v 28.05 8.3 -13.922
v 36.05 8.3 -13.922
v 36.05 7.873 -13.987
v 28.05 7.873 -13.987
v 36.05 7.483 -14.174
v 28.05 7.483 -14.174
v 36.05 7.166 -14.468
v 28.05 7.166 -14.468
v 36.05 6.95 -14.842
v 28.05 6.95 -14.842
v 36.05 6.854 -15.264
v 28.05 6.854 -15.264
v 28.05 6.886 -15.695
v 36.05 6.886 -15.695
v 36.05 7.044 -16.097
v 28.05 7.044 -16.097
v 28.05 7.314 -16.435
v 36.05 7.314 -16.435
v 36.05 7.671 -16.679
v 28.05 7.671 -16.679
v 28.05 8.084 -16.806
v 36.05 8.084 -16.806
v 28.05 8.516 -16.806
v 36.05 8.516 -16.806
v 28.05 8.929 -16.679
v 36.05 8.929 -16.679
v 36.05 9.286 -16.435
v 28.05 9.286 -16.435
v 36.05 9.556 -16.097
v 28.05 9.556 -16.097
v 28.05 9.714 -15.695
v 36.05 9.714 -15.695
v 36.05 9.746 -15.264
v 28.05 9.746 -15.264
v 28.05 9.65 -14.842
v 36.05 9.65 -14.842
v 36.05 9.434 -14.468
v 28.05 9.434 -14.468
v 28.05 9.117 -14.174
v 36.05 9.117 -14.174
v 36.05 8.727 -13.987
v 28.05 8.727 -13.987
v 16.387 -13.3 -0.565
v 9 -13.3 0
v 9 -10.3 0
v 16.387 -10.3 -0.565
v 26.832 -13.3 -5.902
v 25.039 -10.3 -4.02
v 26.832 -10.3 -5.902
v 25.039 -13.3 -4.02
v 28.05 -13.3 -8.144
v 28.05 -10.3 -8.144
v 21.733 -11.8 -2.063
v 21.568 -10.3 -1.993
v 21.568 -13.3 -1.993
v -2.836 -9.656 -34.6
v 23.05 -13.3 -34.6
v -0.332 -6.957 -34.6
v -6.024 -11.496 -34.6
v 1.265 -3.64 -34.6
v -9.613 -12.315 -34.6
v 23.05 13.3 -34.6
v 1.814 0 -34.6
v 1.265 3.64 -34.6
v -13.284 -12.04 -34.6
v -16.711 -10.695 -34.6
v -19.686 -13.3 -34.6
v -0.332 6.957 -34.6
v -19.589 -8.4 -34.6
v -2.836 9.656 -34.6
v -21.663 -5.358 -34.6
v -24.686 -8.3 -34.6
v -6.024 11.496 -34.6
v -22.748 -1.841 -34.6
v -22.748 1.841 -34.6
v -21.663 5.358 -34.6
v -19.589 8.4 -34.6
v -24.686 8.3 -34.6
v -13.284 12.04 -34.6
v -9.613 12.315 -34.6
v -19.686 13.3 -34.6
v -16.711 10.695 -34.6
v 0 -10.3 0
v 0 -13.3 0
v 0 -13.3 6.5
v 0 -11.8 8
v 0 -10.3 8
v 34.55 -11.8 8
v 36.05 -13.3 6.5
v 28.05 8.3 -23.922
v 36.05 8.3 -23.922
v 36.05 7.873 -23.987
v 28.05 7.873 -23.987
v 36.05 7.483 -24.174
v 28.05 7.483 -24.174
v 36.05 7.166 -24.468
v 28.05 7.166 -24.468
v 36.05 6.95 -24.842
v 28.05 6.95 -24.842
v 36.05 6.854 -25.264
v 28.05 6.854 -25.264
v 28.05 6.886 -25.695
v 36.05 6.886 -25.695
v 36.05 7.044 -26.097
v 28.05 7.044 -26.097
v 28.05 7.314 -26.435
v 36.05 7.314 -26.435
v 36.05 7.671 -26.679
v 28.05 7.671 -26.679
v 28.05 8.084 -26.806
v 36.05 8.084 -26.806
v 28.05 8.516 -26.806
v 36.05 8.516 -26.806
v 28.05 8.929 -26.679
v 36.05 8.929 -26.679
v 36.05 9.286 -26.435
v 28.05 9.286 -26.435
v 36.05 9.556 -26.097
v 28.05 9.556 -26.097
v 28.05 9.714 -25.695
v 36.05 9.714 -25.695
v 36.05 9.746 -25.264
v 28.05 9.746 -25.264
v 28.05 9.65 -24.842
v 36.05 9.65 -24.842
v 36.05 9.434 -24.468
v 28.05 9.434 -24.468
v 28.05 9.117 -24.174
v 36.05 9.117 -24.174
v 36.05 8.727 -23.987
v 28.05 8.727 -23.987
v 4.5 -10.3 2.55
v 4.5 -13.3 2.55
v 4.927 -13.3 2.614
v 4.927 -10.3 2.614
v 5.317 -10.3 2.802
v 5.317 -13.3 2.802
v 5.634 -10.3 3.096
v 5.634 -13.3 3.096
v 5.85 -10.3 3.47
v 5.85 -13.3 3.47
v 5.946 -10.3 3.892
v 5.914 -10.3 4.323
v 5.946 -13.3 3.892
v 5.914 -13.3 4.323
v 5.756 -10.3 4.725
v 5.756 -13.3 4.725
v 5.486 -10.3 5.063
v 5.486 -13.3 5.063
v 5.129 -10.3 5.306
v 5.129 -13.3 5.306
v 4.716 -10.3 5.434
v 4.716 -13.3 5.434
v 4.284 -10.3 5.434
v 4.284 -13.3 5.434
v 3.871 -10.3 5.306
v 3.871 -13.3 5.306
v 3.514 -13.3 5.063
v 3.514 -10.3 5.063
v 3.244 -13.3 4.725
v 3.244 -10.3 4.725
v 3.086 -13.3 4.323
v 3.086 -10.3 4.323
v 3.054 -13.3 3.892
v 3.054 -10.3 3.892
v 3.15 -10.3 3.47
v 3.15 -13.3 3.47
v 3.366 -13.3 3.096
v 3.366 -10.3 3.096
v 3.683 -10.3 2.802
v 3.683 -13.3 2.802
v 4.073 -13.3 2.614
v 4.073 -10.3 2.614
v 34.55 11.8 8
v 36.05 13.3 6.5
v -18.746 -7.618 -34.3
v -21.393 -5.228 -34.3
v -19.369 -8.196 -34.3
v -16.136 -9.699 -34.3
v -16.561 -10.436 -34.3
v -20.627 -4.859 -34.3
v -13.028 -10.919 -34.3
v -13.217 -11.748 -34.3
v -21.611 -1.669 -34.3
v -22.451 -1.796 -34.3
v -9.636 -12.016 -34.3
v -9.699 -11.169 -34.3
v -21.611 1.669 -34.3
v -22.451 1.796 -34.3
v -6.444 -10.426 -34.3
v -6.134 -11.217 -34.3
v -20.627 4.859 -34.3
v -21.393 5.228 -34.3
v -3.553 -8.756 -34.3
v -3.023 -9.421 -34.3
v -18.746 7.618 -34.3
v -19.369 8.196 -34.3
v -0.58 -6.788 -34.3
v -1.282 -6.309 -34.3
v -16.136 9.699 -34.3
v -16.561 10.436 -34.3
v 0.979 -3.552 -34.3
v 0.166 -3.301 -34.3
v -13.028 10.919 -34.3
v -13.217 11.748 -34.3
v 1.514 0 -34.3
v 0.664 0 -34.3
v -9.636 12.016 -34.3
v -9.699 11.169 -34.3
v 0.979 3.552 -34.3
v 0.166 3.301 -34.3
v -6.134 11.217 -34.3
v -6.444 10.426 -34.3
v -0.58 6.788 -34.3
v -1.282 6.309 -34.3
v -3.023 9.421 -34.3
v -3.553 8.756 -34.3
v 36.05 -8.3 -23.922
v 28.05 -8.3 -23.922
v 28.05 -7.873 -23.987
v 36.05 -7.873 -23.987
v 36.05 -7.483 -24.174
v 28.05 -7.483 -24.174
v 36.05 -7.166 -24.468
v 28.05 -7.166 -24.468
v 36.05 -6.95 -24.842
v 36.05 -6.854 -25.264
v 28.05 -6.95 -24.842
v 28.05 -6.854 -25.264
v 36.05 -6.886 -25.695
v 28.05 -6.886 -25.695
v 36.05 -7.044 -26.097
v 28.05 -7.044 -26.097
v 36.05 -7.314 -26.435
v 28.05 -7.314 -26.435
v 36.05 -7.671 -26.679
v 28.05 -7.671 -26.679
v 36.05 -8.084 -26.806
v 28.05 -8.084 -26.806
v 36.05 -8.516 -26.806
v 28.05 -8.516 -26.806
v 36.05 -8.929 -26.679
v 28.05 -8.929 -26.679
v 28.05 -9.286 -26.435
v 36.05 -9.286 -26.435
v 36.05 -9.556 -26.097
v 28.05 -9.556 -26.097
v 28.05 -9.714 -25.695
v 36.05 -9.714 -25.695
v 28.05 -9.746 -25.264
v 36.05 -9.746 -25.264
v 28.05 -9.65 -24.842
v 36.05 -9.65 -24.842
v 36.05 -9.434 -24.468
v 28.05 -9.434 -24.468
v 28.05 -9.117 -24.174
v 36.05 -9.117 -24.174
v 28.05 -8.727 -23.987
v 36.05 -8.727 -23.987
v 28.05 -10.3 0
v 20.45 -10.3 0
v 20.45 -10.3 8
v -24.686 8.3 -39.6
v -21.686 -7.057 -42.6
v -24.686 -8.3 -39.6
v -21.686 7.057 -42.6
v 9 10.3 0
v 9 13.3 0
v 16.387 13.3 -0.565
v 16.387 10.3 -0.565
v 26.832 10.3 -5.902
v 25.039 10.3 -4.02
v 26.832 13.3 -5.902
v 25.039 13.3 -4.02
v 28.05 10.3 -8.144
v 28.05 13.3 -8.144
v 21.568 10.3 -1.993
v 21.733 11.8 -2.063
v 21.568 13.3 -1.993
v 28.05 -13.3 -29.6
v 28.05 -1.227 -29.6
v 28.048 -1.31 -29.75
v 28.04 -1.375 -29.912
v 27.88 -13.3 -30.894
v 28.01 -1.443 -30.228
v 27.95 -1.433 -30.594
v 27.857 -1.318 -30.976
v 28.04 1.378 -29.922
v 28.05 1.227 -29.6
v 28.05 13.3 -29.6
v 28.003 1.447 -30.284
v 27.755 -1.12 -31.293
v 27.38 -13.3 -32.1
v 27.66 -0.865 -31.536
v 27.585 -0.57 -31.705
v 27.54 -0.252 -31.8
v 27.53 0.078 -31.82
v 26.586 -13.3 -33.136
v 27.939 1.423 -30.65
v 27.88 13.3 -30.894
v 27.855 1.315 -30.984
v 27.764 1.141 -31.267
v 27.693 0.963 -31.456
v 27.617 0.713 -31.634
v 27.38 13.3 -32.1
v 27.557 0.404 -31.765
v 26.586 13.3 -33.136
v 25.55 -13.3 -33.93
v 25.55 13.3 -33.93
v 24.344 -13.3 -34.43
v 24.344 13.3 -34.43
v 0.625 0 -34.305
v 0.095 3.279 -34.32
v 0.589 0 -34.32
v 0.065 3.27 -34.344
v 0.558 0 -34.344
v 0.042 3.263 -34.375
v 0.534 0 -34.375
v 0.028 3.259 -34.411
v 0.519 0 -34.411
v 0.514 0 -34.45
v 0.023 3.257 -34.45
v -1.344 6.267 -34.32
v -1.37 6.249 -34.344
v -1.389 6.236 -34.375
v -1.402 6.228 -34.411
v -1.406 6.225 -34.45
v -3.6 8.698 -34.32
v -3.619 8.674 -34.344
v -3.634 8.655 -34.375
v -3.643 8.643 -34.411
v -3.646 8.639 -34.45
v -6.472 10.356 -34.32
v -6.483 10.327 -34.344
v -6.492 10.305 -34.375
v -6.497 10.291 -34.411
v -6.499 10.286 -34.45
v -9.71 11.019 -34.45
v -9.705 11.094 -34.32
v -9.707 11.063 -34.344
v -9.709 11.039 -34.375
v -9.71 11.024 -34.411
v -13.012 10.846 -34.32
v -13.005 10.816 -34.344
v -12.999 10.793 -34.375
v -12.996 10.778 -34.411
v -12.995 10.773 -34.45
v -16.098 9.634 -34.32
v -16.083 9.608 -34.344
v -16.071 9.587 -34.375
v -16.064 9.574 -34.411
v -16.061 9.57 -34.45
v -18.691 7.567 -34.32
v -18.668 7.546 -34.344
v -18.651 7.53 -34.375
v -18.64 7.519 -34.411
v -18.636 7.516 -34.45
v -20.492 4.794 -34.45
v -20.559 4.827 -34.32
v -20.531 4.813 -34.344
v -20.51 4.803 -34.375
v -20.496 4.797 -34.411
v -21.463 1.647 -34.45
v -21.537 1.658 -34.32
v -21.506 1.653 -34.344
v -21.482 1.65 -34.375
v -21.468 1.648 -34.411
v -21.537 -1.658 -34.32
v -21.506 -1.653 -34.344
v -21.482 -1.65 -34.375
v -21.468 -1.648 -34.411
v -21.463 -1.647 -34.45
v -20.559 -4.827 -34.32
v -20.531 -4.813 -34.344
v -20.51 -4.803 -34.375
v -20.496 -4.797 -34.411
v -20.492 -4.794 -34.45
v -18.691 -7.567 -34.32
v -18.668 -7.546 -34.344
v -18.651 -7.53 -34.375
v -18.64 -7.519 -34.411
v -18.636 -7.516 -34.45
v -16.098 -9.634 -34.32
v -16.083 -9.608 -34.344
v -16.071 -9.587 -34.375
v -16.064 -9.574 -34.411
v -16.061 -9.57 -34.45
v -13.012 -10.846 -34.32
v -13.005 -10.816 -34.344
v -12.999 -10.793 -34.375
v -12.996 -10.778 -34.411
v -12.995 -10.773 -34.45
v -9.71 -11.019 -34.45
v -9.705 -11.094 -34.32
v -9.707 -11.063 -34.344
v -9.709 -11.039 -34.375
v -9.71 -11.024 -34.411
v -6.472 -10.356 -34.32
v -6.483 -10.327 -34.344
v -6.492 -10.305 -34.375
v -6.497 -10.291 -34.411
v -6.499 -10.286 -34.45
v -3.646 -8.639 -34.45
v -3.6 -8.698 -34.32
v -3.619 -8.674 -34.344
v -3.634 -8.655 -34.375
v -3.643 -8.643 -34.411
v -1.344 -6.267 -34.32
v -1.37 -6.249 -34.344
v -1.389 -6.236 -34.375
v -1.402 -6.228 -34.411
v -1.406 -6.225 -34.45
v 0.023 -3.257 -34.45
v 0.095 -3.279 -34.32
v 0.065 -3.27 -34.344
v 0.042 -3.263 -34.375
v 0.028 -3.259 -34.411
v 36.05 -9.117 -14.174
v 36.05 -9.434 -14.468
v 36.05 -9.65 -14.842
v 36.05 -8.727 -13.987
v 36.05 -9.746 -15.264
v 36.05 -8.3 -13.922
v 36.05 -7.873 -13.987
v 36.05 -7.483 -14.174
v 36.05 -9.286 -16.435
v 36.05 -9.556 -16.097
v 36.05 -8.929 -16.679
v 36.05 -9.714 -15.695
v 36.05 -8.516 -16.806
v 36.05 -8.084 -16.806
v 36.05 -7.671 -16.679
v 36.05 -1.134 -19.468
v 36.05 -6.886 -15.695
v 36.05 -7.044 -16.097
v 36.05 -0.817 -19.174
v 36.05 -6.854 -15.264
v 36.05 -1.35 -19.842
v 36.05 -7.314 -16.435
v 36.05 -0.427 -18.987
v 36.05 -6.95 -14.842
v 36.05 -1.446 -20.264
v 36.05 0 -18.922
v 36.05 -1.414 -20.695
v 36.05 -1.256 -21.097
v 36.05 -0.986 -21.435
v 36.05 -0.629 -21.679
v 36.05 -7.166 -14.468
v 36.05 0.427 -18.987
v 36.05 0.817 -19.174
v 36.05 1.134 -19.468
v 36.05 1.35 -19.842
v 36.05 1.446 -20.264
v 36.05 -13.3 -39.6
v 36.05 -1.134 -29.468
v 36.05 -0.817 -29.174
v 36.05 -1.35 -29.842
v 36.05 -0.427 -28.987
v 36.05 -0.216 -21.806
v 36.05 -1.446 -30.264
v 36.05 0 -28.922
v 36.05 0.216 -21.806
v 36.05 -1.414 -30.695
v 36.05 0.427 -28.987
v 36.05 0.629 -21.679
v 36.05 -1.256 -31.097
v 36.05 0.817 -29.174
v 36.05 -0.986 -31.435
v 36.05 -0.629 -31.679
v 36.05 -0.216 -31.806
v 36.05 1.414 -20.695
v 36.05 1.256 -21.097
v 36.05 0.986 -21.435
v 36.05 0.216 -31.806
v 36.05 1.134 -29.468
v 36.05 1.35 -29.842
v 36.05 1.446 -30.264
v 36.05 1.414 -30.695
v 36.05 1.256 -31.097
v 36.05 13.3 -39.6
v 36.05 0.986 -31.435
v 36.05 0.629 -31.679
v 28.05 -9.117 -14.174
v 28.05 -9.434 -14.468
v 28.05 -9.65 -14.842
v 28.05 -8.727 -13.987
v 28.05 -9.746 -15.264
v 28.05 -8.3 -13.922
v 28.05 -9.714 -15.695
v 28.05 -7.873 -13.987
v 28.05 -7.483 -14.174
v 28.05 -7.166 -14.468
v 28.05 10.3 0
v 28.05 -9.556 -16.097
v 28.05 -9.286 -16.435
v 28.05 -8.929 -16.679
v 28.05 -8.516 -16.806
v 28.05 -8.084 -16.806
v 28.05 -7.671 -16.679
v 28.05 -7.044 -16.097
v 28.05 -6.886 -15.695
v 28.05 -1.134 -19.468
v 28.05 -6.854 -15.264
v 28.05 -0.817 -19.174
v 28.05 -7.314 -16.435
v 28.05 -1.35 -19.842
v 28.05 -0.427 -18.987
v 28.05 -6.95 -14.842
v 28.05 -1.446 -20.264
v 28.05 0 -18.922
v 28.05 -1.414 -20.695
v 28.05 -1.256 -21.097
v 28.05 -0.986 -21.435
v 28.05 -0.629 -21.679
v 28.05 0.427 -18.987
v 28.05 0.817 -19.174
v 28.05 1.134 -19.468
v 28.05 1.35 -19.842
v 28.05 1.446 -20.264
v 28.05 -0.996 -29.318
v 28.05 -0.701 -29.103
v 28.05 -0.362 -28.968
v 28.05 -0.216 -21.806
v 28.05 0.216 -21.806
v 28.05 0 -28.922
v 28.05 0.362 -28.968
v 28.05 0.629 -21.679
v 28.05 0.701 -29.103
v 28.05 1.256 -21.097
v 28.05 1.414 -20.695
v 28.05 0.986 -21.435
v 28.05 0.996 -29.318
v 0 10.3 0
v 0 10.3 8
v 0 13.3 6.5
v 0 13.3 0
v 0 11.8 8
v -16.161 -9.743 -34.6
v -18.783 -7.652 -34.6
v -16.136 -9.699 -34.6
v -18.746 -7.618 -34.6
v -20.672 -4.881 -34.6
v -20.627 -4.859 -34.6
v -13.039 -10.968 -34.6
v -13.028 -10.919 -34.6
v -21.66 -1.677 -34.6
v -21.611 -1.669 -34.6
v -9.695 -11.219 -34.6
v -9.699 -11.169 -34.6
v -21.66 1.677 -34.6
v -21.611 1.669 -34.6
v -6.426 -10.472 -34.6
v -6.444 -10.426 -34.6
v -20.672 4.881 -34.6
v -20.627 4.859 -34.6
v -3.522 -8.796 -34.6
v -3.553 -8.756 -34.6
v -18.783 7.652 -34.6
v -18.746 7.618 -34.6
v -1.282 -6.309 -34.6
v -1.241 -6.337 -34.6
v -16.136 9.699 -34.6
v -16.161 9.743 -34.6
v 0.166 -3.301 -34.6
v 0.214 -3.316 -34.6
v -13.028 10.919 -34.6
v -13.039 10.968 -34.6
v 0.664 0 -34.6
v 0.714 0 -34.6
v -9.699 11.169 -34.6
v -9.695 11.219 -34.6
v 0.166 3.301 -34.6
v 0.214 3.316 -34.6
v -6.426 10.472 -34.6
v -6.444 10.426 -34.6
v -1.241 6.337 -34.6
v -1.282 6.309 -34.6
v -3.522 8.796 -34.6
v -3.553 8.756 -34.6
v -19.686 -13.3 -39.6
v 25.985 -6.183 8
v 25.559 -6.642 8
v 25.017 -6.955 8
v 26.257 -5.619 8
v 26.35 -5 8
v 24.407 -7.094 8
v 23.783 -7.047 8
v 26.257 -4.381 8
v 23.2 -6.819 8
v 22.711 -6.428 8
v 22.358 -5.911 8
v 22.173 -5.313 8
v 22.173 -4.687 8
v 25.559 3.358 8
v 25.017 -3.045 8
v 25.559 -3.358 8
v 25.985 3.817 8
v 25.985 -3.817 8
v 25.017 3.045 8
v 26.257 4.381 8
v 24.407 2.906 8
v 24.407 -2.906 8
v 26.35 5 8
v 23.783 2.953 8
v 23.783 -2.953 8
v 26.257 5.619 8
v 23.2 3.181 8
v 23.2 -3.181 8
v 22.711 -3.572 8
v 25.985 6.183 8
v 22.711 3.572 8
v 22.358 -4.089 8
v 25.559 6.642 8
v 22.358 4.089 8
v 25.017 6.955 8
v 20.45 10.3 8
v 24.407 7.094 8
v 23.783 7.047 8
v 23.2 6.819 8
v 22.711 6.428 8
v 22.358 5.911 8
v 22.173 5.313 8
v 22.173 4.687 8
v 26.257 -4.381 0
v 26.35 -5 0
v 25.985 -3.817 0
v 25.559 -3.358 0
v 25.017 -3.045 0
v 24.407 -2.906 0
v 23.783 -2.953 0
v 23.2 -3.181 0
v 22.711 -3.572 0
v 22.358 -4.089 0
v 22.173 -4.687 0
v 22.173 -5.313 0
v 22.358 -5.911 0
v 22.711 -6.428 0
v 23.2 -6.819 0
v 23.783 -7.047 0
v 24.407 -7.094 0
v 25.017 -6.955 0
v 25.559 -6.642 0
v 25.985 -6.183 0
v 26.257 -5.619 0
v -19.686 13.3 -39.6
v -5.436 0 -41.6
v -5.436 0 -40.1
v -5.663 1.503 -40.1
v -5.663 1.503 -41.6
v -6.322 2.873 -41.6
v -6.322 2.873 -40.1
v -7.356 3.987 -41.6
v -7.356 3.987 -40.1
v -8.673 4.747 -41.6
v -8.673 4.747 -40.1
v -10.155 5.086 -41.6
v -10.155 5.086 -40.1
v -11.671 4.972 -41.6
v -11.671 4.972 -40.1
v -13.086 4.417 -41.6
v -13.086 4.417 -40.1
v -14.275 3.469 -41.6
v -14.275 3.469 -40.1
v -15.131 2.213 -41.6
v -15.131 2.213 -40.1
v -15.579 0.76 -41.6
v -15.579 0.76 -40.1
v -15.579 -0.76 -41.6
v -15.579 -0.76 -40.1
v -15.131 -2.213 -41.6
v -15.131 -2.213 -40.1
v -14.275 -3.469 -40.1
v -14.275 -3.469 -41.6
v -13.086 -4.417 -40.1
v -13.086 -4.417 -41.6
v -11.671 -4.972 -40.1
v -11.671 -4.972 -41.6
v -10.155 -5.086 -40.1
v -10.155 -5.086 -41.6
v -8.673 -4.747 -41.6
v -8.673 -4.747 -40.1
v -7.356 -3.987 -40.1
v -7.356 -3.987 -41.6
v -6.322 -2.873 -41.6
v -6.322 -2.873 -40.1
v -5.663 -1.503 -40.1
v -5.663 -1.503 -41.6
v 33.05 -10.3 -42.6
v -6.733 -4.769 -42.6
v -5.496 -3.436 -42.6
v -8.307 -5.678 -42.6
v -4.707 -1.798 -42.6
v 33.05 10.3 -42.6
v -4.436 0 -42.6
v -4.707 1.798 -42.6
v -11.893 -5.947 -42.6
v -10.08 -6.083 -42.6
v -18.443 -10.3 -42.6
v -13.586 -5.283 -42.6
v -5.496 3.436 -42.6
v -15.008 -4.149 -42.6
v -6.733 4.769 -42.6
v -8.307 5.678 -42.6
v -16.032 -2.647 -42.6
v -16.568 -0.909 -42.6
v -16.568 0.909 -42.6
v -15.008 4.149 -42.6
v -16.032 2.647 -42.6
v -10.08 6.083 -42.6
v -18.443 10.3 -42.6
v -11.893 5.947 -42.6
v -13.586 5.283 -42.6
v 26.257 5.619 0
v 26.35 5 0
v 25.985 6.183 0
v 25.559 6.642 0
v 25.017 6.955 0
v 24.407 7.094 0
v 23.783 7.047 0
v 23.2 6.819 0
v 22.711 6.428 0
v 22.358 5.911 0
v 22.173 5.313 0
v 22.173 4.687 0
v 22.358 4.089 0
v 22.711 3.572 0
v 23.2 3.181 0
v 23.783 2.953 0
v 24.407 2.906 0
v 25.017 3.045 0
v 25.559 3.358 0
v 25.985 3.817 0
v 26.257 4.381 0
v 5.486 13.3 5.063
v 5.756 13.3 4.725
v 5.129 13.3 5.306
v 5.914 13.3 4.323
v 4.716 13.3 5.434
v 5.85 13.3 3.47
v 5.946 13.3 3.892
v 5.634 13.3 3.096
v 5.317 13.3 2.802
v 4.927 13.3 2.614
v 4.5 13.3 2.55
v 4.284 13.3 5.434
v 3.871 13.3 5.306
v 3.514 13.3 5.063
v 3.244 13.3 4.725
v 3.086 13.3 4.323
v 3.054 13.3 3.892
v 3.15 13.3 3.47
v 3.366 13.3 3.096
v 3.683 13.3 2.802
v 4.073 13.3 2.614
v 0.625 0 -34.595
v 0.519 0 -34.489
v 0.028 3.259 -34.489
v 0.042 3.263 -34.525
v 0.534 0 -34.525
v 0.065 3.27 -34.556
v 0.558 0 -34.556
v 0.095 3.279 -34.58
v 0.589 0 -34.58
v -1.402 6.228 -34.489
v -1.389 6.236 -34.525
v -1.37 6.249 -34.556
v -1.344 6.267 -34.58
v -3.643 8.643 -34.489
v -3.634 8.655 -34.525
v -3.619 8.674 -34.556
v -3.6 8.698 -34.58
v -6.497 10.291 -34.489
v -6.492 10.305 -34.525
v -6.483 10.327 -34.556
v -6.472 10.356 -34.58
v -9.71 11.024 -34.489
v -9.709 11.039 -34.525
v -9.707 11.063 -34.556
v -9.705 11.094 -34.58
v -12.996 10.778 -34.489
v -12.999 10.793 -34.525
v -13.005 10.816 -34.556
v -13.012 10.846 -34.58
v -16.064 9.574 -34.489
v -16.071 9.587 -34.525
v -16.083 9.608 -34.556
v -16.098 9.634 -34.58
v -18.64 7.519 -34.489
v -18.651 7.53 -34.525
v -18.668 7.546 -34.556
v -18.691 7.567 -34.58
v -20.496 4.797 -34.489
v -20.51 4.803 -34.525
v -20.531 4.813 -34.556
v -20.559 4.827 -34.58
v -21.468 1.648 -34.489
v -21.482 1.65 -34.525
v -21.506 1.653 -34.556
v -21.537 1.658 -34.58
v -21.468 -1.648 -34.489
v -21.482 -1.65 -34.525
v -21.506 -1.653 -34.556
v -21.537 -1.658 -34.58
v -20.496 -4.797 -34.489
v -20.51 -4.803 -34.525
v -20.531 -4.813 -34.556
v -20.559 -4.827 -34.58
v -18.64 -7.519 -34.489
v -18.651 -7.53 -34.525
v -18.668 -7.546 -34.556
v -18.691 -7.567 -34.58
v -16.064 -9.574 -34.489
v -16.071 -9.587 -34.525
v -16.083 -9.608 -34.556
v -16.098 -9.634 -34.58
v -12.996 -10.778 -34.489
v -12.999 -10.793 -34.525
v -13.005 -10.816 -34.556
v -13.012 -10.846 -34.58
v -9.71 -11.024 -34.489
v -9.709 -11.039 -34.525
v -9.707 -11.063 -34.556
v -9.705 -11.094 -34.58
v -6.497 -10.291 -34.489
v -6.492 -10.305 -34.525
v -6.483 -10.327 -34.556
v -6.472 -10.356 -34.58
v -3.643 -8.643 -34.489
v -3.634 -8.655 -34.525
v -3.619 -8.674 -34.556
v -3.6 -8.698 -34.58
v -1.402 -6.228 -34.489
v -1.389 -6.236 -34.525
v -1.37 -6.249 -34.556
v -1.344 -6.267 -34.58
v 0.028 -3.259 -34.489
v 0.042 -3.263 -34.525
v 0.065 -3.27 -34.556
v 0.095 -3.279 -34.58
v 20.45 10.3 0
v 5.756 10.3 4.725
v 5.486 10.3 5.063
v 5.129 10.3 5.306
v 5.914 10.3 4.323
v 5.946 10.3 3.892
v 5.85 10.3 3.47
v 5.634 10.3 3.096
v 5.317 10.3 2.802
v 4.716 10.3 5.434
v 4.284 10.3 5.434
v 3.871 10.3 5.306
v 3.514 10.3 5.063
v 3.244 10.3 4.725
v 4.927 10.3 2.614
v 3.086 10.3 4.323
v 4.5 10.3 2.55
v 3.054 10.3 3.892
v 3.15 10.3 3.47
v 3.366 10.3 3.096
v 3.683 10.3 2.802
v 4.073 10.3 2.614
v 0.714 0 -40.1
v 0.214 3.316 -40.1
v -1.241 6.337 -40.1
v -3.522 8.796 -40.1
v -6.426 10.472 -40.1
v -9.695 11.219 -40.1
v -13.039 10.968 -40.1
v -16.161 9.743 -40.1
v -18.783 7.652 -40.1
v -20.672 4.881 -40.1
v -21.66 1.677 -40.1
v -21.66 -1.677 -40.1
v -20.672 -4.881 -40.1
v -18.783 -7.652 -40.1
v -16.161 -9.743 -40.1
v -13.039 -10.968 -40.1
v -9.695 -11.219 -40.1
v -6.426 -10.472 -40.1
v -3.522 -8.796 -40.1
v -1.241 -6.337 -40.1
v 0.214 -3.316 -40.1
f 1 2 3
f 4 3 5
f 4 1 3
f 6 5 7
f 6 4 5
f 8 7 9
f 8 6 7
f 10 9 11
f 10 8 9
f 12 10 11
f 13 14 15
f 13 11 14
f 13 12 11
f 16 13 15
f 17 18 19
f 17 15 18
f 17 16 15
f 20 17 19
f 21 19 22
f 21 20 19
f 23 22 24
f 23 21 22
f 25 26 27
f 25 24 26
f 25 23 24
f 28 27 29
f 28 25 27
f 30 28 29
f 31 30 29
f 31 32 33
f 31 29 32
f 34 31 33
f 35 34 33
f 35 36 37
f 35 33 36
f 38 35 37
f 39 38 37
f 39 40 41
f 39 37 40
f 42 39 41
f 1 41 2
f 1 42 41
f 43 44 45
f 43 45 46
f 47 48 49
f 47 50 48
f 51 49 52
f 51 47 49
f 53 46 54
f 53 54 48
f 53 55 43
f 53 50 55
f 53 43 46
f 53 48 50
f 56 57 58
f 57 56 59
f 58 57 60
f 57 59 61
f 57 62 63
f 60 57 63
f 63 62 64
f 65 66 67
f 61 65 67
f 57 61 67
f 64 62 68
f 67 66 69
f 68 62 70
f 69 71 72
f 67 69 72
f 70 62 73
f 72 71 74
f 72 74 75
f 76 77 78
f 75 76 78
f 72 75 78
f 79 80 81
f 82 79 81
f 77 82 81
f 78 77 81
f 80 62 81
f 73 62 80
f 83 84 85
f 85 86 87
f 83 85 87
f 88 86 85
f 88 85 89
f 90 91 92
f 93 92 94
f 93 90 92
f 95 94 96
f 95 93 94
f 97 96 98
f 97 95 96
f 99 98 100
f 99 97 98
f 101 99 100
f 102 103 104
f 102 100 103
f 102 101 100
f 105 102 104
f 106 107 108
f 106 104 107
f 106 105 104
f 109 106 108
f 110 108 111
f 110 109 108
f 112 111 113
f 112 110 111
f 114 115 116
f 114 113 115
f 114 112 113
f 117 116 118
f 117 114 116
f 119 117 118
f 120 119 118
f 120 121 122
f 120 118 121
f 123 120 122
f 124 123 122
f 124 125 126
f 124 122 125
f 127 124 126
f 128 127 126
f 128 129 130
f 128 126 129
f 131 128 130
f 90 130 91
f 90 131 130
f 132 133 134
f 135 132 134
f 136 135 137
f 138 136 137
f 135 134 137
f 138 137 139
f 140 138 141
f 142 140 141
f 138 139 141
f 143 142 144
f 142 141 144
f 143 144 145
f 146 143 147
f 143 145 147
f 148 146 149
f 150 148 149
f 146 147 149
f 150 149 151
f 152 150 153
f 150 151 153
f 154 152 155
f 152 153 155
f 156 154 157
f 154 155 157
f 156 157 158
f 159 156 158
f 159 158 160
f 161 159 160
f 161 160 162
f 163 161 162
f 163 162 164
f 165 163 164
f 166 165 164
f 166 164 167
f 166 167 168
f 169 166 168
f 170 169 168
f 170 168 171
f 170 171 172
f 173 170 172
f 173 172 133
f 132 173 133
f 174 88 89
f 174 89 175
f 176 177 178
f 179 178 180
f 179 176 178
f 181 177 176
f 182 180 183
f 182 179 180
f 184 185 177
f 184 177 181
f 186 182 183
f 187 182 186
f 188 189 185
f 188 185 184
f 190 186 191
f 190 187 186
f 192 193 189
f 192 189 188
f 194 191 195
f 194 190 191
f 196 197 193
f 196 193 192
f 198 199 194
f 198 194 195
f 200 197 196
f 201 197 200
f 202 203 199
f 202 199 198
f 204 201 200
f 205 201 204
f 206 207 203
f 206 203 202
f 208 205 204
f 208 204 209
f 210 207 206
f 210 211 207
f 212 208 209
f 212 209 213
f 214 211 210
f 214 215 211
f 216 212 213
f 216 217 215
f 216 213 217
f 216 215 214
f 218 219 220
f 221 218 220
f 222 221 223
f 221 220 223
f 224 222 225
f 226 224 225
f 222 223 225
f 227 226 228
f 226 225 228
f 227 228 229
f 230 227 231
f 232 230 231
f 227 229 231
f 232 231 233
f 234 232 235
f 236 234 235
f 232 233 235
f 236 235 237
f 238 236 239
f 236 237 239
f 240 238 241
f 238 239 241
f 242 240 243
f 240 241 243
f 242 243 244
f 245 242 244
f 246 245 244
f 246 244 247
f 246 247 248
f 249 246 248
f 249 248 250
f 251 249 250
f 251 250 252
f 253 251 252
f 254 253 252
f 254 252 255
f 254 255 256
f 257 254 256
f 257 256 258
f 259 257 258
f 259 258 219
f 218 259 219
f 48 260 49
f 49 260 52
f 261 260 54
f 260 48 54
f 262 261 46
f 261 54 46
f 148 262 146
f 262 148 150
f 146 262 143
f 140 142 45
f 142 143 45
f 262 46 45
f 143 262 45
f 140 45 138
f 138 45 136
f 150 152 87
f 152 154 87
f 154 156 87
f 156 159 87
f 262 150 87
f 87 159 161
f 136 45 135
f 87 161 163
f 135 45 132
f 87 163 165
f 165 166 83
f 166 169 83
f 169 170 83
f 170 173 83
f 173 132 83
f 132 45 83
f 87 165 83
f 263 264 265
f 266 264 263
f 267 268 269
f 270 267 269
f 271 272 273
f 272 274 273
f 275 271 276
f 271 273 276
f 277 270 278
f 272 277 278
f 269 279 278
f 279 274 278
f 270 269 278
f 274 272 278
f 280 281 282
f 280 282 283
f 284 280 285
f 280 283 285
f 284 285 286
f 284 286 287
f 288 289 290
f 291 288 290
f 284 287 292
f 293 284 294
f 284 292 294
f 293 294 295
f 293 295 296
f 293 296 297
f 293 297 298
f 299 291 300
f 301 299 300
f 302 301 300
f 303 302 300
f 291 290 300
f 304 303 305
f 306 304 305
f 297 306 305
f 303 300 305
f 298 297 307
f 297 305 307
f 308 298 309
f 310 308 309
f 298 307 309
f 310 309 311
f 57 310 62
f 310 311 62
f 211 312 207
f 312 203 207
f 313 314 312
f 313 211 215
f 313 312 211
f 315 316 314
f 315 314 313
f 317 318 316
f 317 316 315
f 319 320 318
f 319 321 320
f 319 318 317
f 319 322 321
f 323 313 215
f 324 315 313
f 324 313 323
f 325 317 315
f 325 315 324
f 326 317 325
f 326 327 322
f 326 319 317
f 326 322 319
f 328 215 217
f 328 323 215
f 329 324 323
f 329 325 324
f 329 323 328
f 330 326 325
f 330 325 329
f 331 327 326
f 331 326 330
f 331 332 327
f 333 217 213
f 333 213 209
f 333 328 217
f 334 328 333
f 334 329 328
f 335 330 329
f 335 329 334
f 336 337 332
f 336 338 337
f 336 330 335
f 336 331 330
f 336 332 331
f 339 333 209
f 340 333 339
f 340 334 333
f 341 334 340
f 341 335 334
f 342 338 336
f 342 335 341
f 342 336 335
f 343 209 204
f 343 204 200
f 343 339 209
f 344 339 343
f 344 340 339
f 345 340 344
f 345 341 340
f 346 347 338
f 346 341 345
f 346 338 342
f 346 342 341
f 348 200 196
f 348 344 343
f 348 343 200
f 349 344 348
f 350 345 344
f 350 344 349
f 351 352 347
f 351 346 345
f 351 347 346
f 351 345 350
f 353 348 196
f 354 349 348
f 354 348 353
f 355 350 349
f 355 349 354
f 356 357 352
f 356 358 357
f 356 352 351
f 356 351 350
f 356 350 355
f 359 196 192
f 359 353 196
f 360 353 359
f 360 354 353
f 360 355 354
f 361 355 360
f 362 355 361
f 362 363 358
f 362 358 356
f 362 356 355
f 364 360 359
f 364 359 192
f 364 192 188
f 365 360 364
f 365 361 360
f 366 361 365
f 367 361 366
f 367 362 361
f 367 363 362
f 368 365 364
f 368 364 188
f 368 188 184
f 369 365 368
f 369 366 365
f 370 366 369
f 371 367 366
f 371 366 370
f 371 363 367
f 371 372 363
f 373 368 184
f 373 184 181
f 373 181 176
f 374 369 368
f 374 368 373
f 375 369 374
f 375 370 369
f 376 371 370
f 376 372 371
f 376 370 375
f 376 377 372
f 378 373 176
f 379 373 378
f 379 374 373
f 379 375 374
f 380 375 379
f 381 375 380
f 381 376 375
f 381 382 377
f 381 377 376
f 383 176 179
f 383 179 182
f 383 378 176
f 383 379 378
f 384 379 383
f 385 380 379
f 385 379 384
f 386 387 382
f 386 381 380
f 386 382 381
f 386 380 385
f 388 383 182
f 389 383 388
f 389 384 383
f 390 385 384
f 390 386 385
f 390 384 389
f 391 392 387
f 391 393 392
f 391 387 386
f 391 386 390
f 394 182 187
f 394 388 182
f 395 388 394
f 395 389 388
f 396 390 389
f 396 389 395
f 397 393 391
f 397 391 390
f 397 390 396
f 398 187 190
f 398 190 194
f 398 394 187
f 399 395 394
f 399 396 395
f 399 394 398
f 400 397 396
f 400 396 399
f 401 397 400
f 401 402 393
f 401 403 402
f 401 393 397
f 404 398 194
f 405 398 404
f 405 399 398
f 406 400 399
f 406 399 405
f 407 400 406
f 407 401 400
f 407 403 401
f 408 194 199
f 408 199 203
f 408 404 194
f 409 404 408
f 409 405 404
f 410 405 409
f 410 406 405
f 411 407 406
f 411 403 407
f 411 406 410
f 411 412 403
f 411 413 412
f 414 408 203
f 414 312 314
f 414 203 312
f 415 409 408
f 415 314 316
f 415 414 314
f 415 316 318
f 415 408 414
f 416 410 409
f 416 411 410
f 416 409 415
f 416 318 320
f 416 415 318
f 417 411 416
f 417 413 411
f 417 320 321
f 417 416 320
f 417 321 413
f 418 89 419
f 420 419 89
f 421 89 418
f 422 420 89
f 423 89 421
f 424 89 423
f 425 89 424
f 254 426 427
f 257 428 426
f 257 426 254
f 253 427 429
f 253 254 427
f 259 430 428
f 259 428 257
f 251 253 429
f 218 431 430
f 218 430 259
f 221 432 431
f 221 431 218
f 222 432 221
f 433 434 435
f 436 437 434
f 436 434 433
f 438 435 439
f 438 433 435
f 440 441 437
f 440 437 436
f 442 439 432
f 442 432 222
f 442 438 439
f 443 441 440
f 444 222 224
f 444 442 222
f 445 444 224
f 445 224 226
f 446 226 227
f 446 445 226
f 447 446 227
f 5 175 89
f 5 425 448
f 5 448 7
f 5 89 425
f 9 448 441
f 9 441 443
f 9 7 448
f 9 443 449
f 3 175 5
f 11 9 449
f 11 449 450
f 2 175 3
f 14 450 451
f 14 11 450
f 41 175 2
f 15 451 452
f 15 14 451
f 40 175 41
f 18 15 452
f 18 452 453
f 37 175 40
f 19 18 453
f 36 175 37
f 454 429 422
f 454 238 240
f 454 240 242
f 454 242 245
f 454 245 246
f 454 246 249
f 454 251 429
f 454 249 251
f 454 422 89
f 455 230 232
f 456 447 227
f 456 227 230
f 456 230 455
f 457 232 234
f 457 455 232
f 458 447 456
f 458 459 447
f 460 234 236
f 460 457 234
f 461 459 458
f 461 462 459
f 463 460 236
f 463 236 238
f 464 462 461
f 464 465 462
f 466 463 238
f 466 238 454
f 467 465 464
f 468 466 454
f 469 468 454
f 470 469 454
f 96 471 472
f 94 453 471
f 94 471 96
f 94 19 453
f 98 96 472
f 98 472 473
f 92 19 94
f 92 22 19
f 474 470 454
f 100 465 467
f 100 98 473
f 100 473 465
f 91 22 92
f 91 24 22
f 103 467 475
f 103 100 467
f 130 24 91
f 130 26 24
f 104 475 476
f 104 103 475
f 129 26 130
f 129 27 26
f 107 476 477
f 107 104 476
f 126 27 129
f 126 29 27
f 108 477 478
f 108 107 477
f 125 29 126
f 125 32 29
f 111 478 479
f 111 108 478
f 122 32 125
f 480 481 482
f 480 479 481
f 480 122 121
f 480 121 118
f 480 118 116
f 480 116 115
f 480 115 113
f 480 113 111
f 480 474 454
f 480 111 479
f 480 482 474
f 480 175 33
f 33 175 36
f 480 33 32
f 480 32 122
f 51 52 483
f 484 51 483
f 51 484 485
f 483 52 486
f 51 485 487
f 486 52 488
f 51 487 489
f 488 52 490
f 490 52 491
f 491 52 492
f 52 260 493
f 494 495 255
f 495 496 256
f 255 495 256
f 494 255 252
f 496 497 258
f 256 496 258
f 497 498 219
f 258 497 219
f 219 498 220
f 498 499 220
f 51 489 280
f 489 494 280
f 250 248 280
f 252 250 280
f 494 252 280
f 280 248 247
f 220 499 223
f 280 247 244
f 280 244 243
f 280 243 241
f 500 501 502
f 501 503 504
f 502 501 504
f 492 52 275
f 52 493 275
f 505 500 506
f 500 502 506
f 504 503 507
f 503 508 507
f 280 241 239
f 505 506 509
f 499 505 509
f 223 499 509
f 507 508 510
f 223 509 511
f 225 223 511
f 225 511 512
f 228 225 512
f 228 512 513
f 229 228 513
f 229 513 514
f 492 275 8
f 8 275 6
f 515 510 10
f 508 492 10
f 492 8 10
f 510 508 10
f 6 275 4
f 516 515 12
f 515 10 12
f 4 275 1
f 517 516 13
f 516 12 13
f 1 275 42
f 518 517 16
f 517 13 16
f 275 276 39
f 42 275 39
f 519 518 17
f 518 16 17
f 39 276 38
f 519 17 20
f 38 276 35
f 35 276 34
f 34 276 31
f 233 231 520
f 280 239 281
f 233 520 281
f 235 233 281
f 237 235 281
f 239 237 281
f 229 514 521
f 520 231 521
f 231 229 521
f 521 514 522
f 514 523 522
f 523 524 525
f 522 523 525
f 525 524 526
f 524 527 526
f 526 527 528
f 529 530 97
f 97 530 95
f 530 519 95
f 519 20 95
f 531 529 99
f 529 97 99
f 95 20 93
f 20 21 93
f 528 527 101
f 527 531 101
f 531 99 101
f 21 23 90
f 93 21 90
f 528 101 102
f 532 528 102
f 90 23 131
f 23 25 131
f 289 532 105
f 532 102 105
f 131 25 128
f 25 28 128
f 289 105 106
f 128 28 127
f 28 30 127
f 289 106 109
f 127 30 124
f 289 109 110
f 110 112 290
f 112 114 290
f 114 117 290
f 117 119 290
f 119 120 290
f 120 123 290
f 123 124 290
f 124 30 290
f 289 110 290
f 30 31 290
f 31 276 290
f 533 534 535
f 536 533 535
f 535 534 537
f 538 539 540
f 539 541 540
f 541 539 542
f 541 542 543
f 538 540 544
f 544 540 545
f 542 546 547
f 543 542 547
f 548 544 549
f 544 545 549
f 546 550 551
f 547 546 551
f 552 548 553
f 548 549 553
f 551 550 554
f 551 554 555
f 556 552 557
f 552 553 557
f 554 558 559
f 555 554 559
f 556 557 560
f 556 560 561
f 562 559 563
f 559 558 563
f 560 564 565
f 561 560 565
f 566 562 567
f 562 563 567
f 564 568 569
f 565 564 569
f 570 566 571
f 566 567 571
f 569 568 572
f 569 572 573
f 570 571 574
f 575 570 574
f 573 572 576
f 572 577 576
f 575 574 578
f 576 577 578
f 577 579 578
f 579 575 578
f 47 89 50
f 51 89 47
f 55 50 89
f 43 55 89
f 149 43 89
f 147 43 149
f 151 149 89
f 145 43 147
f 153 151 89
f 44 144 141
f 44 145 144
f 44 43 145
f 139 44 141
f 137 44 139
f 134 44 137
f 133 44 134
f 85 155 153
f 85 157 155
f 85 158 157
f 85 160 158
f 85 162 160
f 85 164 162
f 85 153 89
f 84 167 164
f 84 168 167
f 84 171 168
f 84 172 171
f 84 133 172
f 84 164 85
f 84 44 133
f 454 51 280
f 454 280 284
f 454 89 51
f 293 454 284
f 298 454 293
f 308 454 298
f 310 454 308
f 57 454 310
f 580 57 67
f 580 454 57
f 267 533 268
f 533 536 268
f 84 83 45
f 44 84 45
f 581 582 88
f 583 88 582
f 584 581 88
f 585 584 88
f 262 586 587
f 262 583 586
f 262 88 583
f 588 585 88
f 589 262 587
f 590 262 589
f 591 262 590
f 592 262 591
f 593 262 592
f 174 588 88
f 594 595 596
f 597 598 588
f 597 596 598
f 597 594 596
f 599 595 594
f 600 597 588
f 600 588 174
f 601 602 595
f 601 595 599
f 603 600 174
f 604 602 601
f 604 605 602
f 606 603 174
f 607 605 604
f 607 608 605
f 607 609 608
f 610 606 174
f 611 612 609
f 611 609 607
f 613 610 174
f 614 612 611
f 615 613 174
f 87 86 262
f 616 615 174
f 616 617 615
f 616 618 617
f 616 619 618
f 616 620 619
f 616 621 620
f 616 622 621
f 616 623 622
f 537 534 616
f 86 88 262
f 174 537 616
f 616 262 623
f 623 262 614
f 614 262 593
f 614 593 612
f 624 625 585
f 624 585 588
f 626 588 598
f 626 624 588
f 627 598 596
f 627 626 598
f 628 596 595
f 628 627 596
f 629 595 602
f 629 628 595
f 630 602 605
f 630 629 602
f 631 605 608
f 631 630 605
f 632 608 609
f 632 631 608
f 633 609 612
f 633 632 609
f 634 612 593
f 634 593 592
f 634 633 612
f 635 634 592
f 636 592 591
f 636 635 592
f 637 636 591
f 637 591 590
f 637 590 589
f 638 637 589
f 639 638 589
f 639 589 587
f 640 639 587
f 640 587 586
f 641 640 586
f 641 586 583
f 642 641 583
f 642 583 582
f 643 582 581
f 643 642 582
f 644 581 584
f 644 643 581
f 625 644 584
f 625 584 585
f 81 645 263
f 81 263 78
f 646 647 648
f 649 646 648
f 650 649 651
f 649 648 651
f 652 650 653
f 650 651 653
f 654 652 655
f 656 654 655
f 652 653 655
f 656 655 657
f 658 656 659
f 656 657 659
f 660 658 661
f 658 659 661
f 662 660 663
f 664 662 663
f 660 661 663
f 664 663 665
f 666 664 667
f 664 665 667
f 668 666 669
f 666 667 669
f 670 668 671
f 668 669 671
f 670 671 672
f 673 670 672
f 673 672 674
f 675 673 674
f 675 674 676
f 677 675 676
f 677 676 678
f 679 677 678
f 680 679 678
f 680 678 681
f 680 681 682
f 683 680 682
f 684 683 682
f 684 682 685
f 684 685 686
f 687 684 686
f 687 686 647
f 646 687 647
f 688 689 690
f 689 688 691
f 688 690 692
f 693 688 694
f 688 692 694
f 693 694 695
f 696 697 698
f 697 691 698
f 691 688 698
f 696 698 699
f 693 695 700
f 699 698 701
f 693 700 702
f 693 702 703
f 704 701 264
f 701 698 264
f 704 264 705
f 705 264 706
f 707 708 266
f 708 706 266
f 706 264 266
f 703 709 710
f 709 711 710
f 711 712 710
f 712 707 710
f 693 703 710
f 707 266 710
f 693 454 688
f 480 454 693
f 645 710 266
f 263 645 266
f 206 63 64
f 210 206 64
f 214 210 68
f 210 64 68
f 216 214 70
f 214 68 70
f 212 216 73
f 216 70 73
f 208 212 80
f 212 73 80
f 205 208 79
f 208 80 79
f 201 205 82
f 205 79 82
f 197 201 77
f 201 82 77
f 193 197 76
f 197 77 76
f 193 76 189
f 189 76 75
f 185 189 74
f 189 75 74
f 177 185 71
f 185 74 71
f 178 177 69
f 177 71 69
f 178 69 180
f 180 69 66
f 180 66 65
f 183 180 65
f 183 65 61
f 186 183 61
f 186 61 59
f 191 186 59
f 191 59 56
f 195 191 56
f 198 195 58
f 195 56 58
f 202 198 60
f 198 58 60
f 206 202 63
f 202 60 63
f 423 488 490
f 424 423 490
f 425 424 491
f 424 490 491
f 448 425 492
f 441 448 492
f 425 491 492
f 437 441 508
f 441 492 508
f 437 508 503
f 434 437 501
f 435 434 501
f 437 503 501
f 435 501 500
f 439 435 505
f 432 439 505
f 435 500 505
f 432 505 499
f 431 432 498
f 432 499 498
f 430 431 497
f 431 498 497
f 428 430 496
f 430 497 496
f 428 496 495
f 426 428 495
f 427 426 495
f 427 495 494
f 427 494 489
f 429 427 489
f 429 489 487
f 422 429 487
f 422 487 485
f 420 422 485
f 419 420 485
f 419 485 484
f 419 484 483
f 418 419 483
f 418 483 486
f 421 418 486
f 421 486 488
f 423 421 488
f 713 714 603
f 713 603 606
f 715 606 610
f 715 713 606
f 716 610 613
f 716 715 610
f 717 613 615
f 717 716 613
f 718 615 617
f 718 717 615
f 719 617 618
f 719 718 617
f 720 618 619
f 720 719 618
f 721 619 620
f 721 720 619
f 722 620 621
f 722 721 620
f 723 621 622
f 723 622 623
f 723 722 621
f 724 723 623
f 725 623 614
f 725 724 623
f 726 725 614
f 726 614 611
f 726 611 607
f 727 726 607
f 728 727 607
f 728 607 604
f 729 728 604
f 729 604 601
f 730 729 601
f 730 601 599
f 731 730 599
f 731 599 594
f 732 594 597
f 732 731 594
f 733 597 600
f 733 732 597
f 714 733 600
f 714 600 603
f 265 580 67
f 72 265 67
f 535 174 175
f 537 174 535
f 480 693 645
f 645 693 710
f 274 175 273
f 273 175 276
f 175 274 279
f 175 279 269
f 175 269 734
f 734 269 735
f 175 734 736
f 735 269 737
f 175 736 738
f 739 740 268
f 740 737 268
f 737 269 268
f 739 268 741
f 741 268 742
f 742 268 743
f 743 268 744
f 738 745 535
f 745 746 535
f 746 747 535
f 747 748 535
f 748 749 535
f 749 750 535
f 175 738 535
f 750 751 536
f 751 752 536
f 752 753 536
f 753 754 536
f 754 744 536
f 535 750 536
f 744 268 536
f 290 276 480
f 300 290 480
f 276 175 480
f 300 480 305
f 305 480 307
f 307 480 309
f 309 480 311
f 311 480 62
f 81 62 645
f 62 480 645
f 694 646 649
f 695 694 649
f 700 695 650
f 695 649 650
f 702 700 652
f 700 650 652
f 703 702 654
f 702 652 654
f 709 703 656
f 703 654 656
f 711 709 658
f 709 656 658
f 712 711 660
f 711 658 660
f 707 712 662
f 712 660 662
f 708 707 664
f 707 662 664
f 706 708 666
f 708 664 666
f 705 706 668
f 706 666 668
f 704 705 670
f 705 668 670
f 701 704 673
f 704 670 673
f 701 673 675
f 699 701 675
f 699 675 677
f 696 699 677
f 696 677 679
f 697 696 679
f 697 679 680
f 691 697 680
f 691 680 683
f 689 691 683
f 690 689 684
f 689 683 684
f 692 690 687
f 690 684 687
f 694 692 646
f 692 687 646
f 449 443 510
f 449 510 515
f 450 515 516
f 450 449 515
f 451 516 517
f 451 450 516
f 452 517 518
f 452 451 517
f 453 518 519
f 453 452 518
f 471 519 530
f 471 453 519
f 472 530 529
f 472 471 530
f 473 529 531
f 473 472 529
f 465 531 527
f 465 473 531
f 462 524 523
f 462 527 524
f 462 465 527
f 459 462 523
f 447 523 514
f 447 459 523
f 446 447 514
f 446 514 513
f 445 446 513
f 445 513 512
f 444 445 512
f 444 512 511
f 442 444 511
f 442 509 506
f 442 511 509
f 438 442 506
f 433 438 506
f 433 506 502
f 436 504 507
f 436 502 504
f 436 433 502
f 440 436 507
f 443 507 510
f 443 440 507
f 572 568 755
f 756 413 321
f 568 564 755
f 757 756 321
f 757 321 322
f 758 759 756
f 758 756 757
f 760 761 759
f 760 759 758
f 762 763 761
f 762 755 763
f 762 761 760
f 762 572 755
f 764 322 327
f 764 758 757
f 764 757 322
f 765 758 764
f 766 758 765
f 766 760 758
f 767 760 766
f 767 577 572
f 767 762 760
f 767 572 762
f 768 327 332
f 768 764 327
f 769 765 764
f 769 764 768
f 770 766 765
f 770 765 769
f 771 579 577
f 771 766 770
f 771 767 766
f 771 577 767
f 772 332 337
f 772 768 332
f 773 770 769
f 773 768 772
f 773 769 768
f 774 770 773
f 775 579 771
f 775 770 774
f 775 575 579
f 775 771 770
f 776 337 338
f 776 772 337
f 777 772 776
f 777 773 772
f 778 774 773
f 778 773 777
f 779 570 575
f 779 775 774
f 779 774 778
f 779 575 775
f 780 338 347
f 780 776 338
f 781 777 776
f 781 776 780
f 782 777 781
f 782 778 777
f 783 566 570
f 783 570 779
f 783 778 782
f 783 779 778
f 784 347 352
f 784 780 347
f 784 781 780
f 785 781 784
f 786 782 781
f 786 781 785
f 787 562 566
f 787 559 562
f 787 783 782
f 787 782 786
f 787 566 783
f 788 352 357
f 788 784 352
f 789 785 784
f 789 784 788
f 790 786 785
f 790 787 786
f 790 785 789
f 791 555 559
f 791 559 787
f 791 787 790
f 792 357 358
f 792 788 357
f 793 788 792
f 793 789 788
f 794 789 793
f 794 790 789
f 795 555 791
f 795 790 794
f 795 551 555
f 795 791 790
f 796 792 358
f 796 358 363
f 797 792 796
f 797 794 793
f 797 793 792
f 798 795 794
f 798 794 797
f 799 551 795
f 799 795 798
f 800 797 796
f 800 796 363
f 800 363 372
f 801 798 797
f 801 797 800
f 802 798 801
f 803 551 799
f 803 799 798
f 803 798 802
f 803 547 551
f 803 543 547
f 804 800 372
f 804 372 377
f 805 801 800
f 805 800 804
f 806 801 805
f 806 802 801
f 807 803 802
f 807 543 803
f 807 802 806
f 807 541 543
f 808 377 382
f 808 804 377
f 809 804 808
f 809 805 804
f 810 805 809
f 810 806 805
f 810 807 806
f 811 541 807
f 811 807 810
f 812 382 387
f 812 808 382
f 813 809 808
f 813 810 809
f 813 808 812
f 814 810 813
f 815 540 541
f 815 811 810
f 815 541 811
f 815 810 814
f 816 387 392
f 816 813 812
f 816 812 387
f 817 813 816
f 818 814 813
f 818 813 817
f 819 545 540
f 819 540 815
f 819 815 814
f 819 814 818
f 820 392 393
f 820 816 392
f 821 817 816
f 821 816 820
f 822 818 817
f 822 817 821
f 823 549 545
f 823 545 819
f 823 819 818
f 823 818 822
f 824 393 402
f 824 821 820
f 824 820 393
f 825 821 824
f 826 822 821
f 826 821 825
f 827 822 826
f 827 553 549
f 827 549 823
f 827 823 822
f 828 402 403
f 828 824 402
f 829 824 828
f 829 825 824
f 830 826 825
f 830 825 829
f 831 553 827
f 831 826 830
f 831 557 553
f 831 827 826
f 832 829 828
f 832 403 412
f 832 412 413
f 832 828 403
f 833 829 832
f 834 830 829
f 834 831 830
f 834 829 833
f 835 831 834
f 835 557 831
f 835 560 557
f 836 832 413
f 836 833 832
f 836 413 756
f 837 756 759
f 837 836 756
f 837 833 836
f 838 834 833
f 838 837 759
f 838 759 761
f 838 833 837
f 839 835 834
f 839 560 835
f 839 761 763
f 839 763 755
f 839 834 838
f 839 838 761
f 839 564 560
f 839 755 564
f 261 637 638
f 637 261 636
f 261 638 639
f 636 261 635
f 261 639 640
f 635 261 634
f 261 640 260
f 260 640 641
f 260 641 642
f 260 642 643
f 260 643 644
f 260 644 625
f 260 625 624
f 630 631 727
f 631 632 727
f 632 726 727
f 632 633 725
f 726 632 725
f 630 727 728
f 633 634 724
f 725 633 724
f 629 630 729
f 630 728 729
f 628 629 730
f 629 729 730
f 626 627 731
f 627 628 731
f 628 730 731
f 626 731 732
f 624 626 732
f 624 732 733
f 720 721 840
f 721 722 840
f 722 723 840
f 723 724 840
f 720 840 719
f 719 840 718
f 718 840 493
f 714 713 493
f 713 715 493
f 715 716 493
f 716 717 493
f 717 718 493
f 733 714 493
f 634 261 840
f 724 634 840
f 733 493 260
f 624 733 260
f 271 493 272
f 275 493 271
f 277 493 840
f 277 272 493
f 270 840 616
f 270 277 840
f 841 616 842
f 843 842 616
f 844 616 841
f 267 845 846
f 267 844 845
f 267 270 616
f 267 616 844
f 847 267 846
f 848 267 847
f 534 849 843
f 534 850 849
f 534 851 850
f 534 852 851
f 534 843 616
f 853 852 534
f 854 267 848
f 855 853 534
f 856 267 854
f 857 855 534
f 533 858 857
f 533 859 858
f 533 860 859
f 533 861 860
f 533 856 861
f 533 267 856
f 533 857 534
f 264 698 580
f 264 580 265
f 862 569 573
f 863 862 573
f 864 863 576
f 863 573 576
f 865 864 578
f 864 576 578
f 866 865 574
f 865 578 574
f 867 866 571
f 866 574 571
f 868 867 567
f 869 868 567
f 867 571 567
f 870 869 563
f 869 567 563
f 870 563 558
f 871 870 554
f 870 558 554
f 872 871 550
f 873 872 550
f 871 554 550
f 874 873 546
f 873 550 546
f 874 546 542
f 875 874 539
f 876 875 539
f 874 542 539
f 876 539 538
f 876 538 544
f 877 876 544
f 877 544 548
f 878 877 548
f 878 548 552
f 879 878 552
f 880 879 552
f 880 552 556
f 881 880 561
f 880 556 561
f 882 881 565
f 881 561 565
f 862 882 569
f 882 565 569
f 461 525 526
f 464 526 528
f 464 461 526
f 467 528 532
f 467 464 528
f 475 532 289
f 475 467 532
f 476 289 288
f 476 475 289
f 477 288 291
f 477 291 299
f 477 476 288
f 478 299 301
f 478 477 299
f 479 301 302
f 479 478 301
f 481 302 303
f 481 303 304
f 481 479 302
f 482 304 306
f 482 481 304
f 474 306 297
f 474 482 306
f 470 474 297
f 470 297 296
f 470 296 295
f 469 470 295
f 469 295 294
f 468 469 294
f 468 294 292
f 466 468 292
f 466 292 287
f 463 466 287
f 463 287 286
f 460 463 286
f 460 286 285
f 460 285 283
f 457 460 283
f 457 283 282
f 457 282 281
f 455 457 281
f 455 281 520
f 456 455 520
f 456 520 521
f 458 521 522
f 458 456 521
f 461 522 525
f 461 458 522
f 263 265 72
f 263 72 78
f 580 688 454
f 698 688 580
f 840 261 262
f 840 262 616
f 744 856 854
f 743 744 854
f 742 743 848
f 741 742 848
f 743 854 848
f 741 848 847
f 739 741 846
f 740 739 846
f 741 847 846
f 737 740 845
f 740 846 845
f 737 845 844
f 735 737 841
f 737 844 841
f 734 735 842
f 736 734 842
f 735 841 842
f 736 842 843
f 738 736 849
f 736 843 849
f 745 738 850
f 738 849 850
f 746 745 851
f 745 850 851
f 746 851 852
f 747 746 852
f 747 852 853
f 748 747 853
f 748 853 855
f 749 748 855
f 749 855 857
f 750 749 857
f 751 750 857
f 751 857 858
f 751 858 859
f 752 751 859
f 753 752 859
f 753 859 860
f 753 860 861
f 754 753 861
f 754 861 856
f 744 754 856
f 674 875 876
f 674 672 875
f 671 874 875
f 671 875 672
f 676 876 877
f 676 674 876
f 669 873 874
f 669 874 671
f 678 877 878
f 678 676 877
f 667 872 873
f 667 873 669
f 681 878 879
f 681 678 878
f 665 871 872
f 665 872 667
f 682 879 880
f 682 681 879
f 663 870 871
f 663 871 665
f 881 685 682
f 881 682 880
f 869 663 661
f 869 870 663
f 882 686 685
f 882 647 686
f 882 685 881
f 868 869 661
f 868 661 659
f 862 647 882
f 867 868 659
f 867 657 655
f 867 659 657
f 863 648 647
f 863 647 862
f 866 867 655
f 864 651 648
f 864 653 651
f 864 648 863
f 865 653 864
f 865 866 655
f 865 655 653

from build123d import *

# Parameters (mm, degrees)
CROQUIS1_W                 = 56.1
CROQUIS1_H                 = 26.6
CROQUIS1_R                 = 2.1
CROQUIS1_W_2               = 40.9
CROQUIS1_H_2               = 20.6
SALIENTE_EXTRUIR1_DEPTH    = 8
CROQUIS2_W                 = 50.6
CROQUIS2_H                 = 26.6
SALIENTE_EXTRUIR2_DEPTH    = 8
CROQUIS3_W                 = 60.73602496
CROQUIS3_H                 = 26.6
SALIENTE_EXTRUIR3_DEPTH    = 8
CROQUIS4_R                 = 11.25
CORTAR_EXTRUIR1_DEPTH      = 5.5
CROQUIS5_R                 = 5.1
CORTAR_EXTRUIR2_DEPTH      = 62.563808362
CROQUIS6_R                 = 12.05
CROQUIS6_R_2               = 11.05
SALIENTE_EXTRUIR4_DEPTH    = 0.3
CHAFL_N1_SIZE              = 0.3
REDONDEO1_R                = 0.15
CHAFL_N2_SIZE              = 5
CORTAR_EXTRUIR5_REACH      = 65.536
CROQUIS11_W                = 30.047801794
CROQUIS11_H                = 26.6
CROQUIS12_R                = 1.45
CORTAR_EXTRUIR6_DEPTH      = 62.821699265
CHAFL_N8_SIZE              = 3
CHAFL_N9_SIZE              = 1
CHAFL_N10_SIZE             = 1.5
SALIENTE_EXTRUIR7_DEPTH    = 3
REDONDEO3_R                = 5
CROQUIS14_R                = 1.45
CORTAR_EXTRUIR7_DEPTH      = 70.085008007
CORTAR_EXTRUIR8_DEPTH      = 70.085008007
CORTAR_EXTRUIR8_DEPTH_BACK = 70.085008007
CROQUIS15_R                = 1.45


with BuildPart() as part:
    # Croquis1 → Saliente-Extruir1 (new body)
    with BuildSketch(Plane.XY):
        Rectangle(CROQUIS1_W, CROQUIS1_H)
        with Locations((24.250000128, -5)):
            Circle(CROQUIS1_R, mode=Mode.SUBTRACT)
        with Locations((24.250000128, 5)):
            Circle(CROQUIS1_R, mode=Mode.SUBTRACT)
        with Locations((-24.249999872, -5)):
            Circle(CROQUIS1_R, mode=Mode.SUBTRACT)
        with Locations((-24.249999872, 5)):
            Circle(CROQUIS1_R, mode=Mode.SUBTRACT)
        Rectangle(CROQUIS1_W_2, CROQUIS1_H_2, mode=Mode.SUBTRACT)
    extrude(amount=SALIENTE_EXTRUIR1_DEPTH)

    # Croquis2 → Saliente-Extruir2 (add)
    with BuildSketch(Plane(origin=(28.05, 0, 0), x_dir=(0, 0, -1), z_dir=(1, 0, 0))):
        with Locations((17.3, 0)):
            Rectangle(CROQUIS2_W, CROQUIS2_H)
    extrude(amount=SALIENTE_EXTRUIR2_DEPTH)

    # Croquis3 → Saliente-Extruir3 (add)
    with BuildSketch(Plane(origin=(0, 0, -42.6), x_dir=(-1, 0, 0), z_dir=(0, 0, -1))):
        with Locations((-5.68198752, 0)):
            Rectangle(CROQUIS3_W, CROQUIS3_H)
    extrude(amount=-SALIENTE_EXTRUIR3_DEPTH)

    # Croquis4 → Cortar-Extruir1 (cut)
    with BuildSketch(Plane.XY.offset(-34.6)):
        with Locations((-10.53602496, 0)):
            Circle(CROQUIS4_R)
    extrude(amount=-CORTAR_EXTRUIR1_DEPTH, mode=Mode.SUBTRACT)

    # Croquis5 → Cortar-Extruir2 (cut, through all)
    with BuildSketch(Plane.XY.offset(-40.1)):
        with Locations((-10.53602496, 0)):
            Circle(CROQUIS5_R)
    extrude(amount=-CORTAR_EXTRUIR2_DEPTH, mode=Mode.SUBTRACT)

    # Croquis6 → Saliente-Extruir4 (add)
    with BuildSketch(Plane.XY.offset(-34.6)):
        with Locations((-10.53602496, 0)):
            Circle(CROQUIS6_R)
        with Locations((-10.53602496, 0)):
            Circle(CROQUIS6_R_2, mode=Mode.SUBTRACT)
    extrude(amount=SALIENTE_EXTRUIR4_DEPTH)

    # Chaflán1
    chafl_n1_edges = [part.edges().sort_by_distance(p)[0] for p in [
        (-22.58602496, 0, -34.6),
    ]]
    chamfer(chafl_n1_edges, length=CHAFL_N1_SIZE - 0.0001)  # a hair under: the kernel refuses the full size

    # Redondeo1
    redondeo1_edges = [part.edges().sort_by_distance(p)[0] for p in [
        (-21.58602496, 0, -34.6),
        (-21.58602496, 0, -34.3),
    ]]
    fillet(redondeo1_edges, radius=REDONDEO1_R - 0.0001)  # a hair under: the kernel refuses the full size

    # Chaflán2
    chafl_n2_edges = [part.edges().sort_by_distance(p)[0] for p in [
        (-24.68602496, -13.3, -38.6),
        (-24.68602496, 13.3, -38.6),
    ]]
    chamfer(chafl_n2_edges, length=CHAFL_N2_SIZE)

    # Croquis11 → Cortar-Extruir5 (cut, up to next)
    with BuildSketch(Plane.XY.offset(8), mode=Mode.PRIVATE) as cortar_extruir5_sk1:
        with Locations((-15.023900897, 0)):
            Rectangle(CROQUIS11_W, CROQUIS11_H)
    cortar_extruir5_tool1 = extrude(cortar_extruir5_sk1.sketch, amount=-CORTAR_EXTRUIR5_REACH, mode=Mode.PRIVATE) & part.part
    add(cortar_extruir5_tool1.solids().sort_by_distance((-15.023901, 0, 8))[0], mode=Mode.SUBTRACT)

    # Croquis12 → Cortar-Extruir6 (cut, through all)
    with BuildSketch(Plane(origin=(0, -13.3, 0), x_dir=(-1, 0, 0), z_dir=(0, -1, 0))):
        with Locations(Location((-4.5, -4, 0), (0, 0, 90))):
            Circle(CROQUIS12_R)
    extrude(amount=-CORTAR_EXTRUIR6_DEPTH, mode=Mode.SUBTRACT)

    # Chaflán8
    chafl_n8_edges = [part.edges().sort_by_distance(p)[0] for p in [
        (-24.68602496, 0, -42.6),
        (-22.18602496, -10.8, -42.6),
        (-22.18602496, 10.8, -42.6),
        (8.18198752, -13.3, -42.6),
        (8.18198752, 13.3, -42.6),
        (36.05, 0, -42.6),
    ]]
    chamfer(chafl_n8_edges, length=CHAFL_N8_SIZE)

    # Chaflán9
    chafl_n9_edges = [part.edges().sort_by_distance(p)[0] for p in [
        (-15.63602496, 0, -42.6),
    ]]
    chamfer(chafl_n9_edges, length=CHAFL_N9_SIZE)

    # Chaflán10
    chafl_n10_edges = [part.edges().sort_by_distance(p)[0] for p in [
        (18.025, -13.3, 8),
        (36.05, 0, 8),
        (18.025, 13.3, 8),
    ]]
    chamfer(chafl_n10_edges, length=CHAFL_N10_SIZE)

    # Croquis13 → Saliente-Extruir7 (add)
    with BuildSketch(Plane(origin=(0, 13.3, 0), x_dir=(1, 0, 0), z_dir=(0, 1, 0))):
        with BuildLine():
            Line((28.05, 8.144334064), (28.05, 0))
            Line((28.05, 0), (9, 0))
            add(Edge.make_bspline(
                [(9, 0), (24.941361066, 0.053648998), (28.05, 8.144334064)],
                knots=[0, 0, 0, 0.673633708, 0.673633708, 0.673633708], degree=2))
        make_face()
    saliente_extruir7 = extrude(amount=-SALIENTE_EXTRUIR7_DEPTH)

    # Simetría7: Saliente-Extruir7 across plane
    add(saliente_extruir7.mirror(Plane.ZX))

    # Redondeo3
    redondeo3_edges = [part.edges().sort_by_distance(p)[0] for p in [
        (28.05, 0, -34.6),
    ]]
    fillet(redondeo3_edges, radius=REDONDEO3_R)

    # Croquis14 → Cortar-Extruir7 (cut, through all)
    with BuildSketch(Plane.ZY.offset(-28.05)):
        with Locations((-15.372167032, -8.3)):
            Circle(CROQUIS14_R)
        with Locations((-25.372167032, -8.3)):
            Circle(CROQUIS14_R)
    cortar_extruir7 = extrude(amount=-CORTAR_EXTRUIR7_DEPTH, mode=Mode.SUBTRACT)

    # Simetría8: Cortar-Extruir7 across plane
    add(cortar_extruir7.mirror(Plane.ZX), mode=Mode.SUBTRACT)

    # Croquis15 → Cortar-Extruir8 (cut, two sides: drawn at the far end of the back side and taken through both)
    with BuildSketch(Plane.ZY.offset(-28.05).offset(-CORTAR_EXTRUIR8_DEPTH_BACK)):
        with Locations((-20.372167032, 0)):
            Circle(CROQUIS15_R)
        with Locations((-30.372167032, 0)):
            Circle(CROQUIS15_R)
    extrude(amount=CORTAR_EXTRUIR8_DEPTH + CORTAR_EXTRUIR8_DEPTH_BACK, mode=Mode.SUBTRACT)


solid = part.part
